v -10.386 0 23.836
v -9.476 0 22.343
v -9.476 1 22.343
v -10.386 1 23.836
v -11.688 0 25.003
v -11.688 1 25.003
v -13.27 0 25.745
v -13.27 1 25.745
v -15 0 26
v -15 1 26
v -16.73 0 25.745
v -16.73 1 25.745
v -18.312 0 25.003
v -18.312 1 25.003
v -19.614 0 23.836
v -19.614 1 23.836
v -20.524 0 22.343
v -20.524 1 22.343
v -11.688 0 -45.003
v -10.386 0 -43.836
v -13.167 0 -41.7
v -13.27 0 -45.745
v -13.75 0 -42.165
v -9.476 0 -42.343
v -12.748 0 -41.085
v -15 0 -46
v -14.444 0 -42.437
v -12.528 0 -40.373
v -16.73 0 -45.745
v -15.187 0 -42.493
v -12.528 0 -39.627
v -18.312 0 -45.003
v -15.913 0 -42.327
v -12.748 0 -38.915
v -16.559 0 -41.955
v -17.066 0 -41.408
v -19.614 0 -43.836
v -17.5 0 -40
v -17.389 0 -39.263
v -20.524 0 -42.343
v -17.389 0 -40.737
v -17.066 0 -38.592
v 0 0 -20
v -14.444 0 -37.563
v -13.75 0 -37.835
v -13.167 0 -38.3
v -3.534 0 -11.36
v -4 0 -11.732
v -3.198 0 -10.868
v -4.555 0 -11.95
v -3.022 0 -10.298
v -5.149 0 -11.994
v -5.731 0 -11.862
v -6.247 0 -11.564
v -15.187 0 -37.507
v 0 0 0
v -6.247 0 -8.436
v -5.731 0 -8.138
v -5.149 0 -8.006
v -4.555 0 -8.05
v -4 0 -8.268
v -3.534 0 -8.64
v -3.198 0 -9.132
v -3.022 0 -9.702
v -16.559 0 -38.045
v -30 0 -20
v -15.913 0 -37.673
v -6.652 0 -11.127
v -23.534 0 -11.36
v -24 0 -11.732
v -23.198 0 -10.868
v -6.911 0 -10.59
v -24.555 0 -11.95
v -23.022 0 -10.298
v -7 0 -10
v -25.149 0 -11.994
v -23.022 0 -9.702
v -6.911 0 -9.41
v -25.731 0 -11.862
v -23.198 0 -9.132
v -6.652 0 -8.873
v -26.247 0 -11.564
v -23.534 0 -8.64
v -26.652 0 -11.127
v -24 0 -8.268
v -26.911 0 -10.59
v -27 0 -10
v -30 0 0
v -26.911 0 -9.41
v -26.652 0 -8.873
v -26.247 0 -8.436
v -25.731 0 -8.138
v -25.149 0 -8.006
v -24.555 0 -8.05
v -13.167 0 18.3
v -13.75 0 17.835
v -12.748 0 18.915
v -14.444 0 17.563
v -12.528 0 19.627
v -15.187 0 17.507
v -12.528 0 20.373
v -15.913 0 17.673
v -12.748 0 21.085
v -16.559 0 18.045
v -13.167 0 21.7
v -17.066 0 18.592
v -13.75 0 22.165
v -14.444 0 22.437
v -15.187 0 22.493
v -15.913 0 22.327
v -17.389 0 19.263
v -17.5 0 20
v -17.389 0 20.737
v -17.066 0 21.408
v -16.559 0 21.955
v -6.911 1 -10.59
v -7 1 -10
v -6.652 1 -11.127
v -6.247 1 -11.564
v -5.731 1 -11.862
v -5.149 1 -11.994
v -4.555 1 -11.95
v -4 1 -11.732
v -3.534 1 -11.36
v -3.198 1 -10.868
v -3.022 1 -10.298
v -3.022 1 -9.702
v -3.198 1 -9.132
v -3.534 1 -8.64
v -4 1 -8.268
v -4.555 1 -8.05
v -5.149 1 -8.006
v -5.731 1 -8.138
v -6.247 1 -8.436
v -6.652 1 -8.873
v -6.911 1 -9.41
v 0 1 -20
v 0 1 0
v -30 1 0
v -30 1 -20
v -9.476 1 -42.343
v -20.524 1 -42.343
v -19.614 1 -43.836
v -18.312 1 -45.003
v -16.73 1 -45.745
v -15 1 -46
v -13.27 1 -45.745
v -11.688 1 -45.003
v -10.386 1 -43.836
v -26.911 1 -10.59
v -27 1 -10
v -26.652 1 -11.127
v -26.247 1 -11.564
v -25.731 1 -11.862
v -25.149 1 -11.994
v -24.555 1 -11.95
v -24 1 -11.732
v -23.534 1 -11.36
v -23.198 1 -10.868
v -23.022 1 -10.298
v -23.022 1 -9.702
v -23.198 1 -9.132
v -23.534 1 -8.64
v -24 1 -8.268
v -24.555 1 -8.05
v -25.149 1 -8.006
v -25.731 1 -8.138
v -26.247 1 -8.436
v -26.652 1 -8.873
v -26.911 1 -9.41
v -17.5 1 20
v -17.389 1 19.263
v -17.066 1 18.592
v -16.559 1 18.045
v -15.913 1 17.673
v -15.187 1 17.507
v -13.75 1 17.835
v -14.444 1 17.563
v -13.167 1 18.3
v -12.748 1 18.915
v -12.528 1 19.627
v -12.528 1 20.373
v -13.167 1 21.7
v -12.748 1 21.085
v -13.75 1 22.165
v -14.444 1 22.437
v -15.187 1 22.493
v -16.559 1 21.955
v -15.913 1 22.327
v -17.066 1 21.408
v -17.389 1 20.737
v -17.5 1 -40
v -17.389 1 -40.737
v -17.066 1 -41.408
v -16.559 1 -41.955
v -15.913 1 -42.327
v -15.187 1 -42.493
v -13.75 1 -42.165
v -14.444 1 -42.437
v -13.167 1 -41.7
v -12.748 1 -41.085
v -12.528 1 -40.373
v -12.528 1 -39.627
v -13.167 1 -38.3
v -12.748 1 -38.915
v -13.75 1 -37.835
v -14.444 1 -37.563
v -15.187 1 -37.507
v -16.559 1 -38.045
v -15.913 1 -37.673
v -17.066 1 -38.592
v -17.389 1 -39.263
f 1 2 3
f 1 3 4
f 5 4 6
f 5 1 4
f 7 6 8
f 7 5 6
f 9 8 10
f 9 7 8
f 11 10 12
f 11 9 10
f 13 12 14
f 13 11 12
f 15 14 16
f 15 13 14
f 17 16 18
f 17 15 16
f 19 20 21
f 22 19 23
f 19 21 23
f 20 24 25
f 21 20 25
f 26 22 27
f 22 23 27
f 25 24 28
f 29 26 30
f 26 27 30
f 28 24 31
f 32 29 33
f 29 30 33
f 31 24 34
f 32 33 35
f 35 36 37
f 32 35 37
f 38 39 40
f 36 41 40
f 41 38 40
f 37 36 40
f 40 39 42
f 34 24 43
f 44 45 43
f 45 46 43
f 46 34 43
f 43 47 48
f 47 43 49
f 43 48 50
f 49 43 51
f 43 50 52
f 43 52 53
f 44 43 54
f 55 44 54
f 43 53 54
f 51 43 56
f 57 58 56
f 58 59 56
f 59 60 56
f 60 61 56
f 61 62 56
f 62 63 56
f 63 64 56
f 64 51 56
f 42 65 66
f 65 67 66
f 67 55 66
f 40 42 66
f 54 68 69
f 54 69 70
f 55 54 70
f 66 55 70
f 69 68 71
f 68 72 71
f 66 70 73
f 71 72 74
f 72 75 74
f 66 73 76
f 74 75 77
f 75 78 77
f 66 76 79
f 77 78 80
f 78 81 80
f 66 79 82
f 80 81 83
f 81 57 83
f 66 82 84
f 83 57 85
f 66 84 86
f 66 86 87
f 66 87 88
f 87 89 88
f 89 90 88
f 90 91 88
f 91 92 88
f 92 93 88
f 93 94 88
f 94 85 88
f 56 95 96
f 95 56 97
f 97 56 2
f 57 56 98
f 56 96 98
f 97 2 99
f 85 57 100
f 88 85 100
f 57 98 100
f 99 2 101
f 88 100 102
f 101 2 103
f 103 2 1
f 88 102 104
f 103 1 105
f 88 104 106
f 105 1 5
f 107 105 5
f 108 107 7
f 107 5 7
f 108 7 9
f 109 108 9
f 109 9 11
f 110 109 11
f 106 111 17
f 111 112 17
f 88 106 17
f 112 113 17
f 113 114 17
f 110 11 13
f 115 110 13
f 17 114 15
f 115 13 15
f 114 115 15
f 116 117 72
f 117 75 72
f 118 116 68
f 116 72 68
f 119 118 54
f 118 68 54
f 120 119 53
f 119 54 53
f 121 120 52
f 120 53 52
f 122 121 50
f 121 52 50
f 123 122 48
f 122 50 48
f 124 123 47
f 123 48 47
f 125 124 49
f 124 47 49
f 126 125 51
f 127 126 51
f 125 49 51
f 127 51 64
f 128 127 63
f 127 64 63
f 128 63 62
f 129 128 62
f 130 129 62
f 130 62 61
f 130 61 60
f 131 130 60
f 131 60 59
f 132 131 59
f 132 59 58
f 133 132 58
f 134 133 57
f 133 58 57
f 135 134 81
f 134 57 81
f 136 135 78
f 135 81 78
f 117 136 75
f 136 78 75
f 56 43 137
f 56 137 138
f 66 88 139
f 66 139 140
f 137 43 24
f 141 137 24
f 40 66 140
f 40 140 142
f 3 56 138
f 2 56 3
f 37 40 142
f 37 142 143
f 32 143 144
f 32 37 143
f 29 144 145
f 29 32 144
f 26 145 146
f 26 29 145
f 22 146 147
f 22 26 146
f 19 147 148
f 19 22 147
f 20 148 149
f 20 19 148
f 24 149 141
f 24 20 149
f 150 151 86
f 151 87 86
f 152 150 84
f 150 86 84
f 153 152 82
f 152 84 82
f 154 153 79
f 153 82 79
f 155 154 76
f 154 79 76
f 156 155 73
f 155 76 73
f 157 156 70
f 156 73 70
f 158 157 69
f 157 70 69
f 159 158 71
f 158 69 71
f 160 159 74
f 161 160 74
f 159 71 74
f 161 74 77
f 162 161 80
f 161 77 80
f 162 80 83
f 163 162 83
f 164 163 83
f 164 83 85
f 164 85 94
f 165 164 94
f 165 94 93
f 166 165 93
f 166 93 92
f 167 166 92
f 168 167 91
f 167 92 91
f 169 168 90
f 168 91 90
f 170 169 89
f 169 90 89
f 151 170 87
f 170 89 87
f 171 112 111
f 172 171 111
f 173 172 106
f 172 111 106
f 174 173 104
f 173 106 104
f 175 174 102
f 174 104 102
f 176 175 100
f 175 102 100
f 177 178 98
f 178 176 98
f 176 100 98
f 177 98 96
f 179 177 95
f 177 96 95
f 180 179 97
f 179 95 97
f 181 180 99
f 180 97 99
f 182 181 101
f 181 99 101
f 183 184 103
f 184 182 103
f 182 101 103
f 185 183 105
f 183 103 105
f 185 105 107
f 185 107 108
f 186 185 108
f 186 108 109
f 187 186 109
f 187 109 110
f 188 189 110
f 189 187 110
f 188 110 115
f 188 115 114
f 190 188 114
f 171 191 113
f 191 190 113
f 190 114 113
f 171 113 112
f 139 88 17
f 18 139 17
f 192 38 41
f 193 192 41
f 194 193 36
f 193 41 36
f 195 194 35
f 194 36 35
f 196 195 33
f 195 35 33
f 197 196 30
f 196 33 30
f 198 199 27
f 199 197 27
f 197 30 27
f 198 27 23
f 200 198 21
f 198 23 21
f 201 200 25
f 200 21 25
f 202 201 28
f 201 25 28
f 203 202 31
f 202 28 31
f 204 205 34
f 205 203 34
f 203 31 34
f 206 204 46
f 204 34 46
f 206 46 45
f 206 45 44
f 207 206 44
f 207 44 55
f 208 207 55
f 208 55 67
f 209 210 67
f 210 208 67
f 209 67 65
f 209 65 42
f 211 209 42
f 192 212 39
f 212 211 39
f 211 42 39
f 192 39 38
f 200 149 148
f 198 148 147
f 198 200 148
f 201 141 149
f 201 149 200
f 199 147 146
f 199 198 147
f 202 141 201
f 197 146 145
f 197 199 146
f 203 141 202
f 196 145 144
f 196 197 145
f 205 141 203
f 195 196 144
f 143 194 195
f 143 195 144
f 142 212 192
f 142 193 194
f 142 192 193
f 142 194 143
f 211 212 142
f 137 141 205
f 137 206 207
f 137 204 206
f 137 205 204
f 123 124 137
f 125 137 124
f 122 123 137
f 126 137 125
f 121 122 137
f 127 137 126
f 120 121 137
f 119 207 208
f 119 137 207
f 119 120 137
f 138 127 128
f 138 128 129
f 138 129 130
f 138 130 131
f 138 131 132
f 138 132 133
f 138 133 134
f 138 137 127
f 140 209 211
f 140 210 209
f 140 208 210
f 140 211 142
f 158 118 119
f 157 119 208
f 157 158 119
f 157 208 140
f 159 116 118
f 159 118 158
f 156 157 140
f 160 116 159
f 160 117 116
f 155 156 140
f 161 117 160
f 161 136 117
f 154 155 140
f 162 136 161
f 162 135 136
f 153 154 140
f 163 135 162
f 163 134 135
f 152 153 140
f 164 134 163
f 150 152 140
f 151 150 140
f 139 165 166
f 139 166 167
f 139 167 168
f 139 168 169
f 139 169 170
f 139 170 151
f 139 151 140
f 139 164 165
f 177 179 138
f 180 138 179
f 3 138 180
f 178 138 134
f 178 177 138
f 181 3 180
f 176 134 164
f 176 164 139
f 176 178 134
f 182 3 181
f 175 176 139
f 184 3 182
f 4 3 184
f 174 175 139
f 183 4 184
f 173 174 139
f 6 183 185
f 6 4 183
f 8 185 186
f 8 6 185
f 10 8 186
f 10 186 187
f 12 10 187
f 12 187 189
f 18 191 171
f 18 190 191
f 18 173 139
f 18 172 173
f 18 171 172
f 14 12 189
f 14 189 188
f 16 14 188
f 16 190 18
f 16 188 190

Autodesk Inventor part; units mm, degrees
ref_plane "YZ Plane" through (0, 0, 0) normal (1, 0, 0) x (0, 1, 0)
ref_plane "XZ Plane" through (0, 0, 0) normal (0, 1, 0) x (-1, 0, 0)
ref_plane "XY Plane" through (0, 0, 0) normal (0, 0, 1) x (1, 0, 0)
sketch "Sketch1" plane through (0, 0, 0) normal (0, 1, 0) x (-1, 0, 0)
  line L0 (0, 0) -> (30, 0)
  line L1 (30, 0) -> (30, -20)
  line L2 (30, -20) -> (0, -20)
  line L3 (0, -20) -> (0, 0)
  line L4 (30, -10) -> (0, -10)
  line L5 (15, 0) -> (15, -20)
  circle A0 centre (25, -10) radius 2
  circle A1 centre (15, -40) radius 2.5
  circle A2 centre (5, -10) radius 2
  line L6 (30, 0) -> (0, 0)
  arc A3 (9.4763, -42.3428) -> (20.5237, -42.3428) centre (15, -40) ccw
  line L7 (30, -20) -> (20.5237, -42.3428)
  line L8 (0, -20) -> (9.4763, -42.3428)
  line L9 (30, 0) -> (0, 0)
  circle A4 centre (15, 20) radius 2.5
  arc A5 (20.5237, 22.3428) -> (9.4763, 22.3428) centre (15, 20) ccw
  line L10 (30, 0) -> (20.5237, 22.3428)
  line L11 (0, 0) -> (9.4763, 22.3428)
  dimension "d0" = 20
  dimension "d1" = 30
  dimension "d2" = 5
  dimension "d3" = 4
  dimension "d5" = 20
  dimension "d6" = 5
  dimension "d11" = 12
extrude "Extrusion2" add sketch "Sketch1" along normal blind 1 contours L11 A5 L10 L0 | L0 L5 L4 A2 L3 | L0 L1 L4 A0 L5 | L4 A2 L5 L2 L3 | L4 A0 L1 L2 L5 | L2 L7 A3 L8
properties part number "Platte2"
